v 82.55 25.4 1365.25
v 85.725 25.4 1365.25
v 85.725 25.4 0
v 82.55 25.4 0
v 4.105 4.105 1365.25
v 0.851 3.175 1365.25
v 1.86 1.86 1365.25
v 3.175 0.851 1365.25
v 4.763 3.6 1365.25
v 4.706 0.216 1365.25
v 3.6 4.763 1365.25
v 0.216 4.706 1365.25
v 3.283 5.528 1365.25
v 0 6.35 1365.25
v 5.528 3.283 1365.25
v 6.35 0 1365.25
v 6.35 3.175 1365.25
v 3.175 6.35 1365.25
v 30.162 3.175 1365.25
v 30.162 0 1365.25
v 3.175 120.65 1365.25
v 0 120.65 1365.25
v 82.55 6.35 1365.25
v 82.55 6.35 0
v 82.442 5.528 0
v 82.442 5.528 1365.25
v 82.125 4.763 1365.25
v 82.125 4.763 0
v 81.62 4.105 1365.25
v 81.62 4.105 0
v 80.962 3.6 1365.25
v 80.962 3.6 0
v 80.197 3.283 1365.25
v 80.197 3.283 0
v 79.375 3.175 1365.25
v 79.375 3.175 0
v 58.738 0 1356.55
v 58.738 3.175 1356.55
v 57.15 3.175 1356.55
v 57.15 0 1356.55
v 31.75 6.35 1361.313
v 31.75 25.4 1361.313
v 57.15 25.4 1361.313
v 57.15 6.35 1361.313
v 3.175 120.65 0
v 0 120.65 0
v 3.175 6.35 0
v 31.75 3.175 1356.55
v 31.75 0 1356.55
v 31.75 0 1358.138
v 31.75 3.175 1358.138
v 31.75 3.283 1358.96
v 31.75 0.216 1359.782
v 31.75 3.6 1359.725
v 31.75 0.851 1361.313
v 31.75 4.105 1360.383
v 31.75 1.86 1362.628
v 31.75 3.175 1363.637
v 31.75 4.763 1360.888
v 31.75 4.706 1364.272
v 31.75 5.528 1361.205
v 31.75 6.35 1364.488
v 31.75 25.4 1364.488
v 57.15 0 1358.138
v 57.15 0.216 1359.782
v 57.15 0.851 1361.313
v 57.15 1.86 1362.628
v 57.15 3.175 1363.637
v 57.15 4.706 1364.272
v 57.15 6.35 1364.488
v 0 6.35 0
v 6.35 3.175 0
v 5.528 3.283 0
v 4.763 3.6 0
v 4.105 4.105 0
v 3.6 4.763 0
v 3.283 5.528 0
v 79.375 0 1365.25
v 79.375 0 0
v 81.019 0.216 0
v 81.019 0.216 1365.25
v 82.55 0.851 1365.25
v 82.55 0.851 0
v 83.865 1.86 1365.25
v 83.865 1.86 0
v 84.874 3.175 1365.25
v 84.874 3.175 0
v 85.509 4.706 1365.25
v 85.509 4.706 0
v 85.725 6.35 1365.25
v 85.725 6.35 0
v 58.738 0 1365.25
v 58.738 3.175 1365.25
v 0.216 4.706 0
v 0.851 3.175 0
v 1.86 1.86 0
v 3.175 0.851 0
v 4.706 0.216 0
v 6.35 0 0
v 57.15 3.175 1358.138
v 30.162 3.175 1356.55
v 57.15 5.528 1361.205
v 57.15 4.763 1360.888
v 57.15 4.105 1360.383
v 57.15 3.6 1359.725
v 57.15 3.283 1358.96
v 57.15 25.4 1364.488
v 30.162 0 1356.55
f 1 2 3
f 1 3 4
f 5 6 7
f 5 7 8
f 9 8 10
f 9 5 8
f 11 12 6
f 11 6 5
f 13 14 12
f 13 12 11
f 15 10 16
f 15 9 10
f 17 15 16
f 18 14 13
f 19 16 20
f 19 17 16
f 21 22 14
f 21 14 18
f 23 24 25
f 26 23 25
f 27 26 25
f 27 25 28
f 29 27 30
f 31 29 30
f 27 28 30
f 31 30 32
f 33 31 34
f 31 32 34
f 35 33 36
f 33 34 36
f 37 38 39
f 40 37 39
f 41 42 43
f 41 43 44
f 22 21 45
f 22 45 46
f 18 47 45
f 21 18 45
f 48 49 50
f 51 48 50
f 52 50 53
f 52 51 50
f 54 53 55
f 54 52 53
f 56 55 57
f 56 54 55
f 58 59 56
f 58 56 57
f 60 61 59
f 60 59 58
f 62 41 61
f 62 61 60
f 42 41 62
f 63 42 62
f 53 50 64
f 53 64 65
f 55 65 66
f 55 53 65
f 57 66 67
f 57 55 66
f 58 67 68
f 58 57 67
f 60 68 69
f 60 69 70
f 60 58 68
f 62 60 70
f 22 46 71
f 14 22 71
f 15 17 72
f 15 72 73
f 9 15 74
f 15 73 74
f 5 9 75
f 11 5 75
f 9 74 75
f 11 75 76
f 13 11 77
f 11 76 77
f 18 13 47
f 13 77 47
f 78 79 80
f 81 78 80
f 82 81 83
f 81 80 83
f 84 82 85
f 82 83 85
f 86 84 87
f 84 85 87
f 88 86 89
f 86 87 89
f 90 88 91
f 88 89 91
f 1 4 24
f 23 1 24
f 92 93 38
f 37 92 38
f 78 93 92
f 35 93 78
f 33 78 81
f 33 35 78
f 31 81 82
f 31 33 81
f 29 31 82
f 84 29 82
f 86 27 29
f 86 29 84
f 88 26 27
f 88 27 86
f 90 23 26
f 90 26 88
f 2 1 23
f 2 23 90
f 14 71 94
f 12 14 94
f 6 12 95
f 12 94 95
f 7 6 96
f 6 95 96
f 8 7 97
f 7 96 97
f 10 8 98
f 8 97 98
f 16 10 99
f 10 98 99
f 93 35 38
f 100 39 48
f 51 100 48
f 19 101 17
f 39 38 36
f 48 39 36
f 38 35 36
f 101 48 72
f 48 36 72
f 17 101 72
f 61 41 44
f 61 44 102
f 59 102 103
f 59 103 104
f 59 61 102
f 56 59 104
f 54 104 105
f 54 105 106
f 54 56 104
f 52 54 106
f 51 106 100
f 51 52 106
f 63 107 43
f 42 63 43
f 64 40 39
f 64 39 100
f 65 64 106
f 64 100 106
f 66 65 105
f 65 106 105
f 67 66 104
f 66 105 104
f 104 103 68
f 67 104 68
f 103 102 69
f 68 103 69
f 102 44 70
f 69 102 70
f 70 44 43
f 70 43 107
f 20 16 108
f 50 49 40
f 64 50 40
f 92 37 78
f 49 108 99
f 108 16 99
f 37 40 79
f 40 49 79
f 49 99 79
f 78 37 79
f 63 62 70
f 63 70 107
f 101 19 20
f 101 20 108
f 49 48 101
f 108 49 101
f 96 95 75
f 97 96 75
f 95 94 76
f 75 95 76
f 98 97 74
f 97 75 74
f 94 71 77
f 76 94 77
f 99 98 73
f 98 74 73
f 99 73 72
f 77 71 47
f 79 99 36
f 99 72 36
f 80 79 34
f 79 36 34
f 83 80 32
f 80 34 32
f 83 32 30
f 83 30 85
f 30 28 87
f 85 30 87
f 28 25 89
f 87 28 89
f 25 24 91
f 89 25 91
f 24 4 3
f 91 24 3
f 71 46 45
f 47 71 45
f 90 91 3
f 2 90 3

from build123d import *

# Parameters (mm, degrees)
BASE_FLANGE1_DEPTH            = 1365.25
EDGE_FLANGE1_STRIP_W          = 19.812
EDGE_FLANGE1_STRIP_H          = 3.175
EDGE_FLANGE1_STRIP_CUT_DEPTH  = 25.4
EDGE_FLANGE1_RELIEF_W         = 21.3995
EDGE_FLANGE1_RELIEF_H         = 1.5875
EDGE_FLANGE1_RELIEF_CUT_DEPTH = 3.175
EDGE_FLANGE1_DEPTH            = 25.4


# Sheet-metal steps are written as plain solids
with BuildPart() as part:
    # Sketch1 → Base-Flange1 (new body)
    with BuildSketch(Plane.XY):
        with BuildLine():
            Line((0, 120.65), (0, 6.35))
            ThreePointArc((0, 6.35), (1.859871939, 1.859871939), (6.35, 0))
            Line((6.35, 0), (79.375, 0))
            ThreePointArc((79.375, 0), (83.865128061, 1.859871939), (85.725, 6.35))
            Line((85.725, 6.35), (85.725, 25.4))
            Line((85.725, 25.4), (82.55, 25.4))
            Line((82.55, 25.4), (82.55, 6.35))
            ThreePointArc((82.55, 6.35), (81.62006403, 4.10493597), (79.375, 3.175))
            Line((79.375, 3.175), (6.35, 3.175))
            ThreePointArc((6.35, 3.175), (4.10493597, 4.10493597), (3.175, 6.35))
            Line((3.175, 6.35), (3.175, 120.65))
            Line((3.175, 120.65), (0, 120.65))
        make_face()
    extrude(amount=BASE_FLANGE1_DEPTH)

    # Edge-Flange1 strip (across the edge) → Edge-Flange1 strip cut (cut)
    with BuildSketch(Plane(origin=(31.75, 3.175, 1364.488), x_dir=(0, 0, -1), z_dir=(1, 0, 0))):
        with Locations((-3.556, -1.5875)):
            Rectangle(EDGE_FLANGE1_STRIP_W, EDGE_FLANGE1_STRIP_H)
    extrude(amount=EDGE_FLANGE1_STRIP_CUT_DEPTH, mode=Mode.SUBTRACT)

    # Edge-Flange1 relief (on the sheet) → Edge-Flange1 relief cut (cut)
    with BuildSketch(Plane(origin=(31.75, 3.175, 1358.138), x_dir=(0, 0, -1), z_dir=(0, 1, 0))):
        with Locations((-9.11225, 0.79375)):
            Rectangle(EDGE_FLANGE1_RELIEF_W, EDGE_FLANGE1_RELIEF_H)
        with Locations((-9.11225, -26.19375)):
            Rectangle(EDGE_FLANGE1_RELIEF_W, EDGE_FLANGE1_RELIEF_H)
    extrude(amount=-EDGE_FLANGE1_RELIEF_CUT_DEPTH, mode=Mode.SUBTRACT)

    # Edge-Flange1 section (across the edge) → Edge-Flange1 (add)
    with BuildSketch(Plane(origin=(31.75, 3.175, 1364.488), x_dir=(0, 0, -1), z_dir=(1, 0, 0))):
        with BuildLine():
            Line((0, 3.175), (0, 22.225))
            Line((0, 22.225), (3.175, 22.225))
            Line((3.175, 22.225), (3.175, 3.175))
            ThreePointArc((3.175, 3.175), (4.10493597, 0.92993597), (6.35, 0))
            Line((6.35, 0), (6.35, -3.175))
            ThreePointArc((6.35, -3.175), (1.859871939, -1.315128061), (0, 3.175))
        make_face()
    extrude(amount=EDGE_FLANGE1_DEPTH)


solid = part.part
